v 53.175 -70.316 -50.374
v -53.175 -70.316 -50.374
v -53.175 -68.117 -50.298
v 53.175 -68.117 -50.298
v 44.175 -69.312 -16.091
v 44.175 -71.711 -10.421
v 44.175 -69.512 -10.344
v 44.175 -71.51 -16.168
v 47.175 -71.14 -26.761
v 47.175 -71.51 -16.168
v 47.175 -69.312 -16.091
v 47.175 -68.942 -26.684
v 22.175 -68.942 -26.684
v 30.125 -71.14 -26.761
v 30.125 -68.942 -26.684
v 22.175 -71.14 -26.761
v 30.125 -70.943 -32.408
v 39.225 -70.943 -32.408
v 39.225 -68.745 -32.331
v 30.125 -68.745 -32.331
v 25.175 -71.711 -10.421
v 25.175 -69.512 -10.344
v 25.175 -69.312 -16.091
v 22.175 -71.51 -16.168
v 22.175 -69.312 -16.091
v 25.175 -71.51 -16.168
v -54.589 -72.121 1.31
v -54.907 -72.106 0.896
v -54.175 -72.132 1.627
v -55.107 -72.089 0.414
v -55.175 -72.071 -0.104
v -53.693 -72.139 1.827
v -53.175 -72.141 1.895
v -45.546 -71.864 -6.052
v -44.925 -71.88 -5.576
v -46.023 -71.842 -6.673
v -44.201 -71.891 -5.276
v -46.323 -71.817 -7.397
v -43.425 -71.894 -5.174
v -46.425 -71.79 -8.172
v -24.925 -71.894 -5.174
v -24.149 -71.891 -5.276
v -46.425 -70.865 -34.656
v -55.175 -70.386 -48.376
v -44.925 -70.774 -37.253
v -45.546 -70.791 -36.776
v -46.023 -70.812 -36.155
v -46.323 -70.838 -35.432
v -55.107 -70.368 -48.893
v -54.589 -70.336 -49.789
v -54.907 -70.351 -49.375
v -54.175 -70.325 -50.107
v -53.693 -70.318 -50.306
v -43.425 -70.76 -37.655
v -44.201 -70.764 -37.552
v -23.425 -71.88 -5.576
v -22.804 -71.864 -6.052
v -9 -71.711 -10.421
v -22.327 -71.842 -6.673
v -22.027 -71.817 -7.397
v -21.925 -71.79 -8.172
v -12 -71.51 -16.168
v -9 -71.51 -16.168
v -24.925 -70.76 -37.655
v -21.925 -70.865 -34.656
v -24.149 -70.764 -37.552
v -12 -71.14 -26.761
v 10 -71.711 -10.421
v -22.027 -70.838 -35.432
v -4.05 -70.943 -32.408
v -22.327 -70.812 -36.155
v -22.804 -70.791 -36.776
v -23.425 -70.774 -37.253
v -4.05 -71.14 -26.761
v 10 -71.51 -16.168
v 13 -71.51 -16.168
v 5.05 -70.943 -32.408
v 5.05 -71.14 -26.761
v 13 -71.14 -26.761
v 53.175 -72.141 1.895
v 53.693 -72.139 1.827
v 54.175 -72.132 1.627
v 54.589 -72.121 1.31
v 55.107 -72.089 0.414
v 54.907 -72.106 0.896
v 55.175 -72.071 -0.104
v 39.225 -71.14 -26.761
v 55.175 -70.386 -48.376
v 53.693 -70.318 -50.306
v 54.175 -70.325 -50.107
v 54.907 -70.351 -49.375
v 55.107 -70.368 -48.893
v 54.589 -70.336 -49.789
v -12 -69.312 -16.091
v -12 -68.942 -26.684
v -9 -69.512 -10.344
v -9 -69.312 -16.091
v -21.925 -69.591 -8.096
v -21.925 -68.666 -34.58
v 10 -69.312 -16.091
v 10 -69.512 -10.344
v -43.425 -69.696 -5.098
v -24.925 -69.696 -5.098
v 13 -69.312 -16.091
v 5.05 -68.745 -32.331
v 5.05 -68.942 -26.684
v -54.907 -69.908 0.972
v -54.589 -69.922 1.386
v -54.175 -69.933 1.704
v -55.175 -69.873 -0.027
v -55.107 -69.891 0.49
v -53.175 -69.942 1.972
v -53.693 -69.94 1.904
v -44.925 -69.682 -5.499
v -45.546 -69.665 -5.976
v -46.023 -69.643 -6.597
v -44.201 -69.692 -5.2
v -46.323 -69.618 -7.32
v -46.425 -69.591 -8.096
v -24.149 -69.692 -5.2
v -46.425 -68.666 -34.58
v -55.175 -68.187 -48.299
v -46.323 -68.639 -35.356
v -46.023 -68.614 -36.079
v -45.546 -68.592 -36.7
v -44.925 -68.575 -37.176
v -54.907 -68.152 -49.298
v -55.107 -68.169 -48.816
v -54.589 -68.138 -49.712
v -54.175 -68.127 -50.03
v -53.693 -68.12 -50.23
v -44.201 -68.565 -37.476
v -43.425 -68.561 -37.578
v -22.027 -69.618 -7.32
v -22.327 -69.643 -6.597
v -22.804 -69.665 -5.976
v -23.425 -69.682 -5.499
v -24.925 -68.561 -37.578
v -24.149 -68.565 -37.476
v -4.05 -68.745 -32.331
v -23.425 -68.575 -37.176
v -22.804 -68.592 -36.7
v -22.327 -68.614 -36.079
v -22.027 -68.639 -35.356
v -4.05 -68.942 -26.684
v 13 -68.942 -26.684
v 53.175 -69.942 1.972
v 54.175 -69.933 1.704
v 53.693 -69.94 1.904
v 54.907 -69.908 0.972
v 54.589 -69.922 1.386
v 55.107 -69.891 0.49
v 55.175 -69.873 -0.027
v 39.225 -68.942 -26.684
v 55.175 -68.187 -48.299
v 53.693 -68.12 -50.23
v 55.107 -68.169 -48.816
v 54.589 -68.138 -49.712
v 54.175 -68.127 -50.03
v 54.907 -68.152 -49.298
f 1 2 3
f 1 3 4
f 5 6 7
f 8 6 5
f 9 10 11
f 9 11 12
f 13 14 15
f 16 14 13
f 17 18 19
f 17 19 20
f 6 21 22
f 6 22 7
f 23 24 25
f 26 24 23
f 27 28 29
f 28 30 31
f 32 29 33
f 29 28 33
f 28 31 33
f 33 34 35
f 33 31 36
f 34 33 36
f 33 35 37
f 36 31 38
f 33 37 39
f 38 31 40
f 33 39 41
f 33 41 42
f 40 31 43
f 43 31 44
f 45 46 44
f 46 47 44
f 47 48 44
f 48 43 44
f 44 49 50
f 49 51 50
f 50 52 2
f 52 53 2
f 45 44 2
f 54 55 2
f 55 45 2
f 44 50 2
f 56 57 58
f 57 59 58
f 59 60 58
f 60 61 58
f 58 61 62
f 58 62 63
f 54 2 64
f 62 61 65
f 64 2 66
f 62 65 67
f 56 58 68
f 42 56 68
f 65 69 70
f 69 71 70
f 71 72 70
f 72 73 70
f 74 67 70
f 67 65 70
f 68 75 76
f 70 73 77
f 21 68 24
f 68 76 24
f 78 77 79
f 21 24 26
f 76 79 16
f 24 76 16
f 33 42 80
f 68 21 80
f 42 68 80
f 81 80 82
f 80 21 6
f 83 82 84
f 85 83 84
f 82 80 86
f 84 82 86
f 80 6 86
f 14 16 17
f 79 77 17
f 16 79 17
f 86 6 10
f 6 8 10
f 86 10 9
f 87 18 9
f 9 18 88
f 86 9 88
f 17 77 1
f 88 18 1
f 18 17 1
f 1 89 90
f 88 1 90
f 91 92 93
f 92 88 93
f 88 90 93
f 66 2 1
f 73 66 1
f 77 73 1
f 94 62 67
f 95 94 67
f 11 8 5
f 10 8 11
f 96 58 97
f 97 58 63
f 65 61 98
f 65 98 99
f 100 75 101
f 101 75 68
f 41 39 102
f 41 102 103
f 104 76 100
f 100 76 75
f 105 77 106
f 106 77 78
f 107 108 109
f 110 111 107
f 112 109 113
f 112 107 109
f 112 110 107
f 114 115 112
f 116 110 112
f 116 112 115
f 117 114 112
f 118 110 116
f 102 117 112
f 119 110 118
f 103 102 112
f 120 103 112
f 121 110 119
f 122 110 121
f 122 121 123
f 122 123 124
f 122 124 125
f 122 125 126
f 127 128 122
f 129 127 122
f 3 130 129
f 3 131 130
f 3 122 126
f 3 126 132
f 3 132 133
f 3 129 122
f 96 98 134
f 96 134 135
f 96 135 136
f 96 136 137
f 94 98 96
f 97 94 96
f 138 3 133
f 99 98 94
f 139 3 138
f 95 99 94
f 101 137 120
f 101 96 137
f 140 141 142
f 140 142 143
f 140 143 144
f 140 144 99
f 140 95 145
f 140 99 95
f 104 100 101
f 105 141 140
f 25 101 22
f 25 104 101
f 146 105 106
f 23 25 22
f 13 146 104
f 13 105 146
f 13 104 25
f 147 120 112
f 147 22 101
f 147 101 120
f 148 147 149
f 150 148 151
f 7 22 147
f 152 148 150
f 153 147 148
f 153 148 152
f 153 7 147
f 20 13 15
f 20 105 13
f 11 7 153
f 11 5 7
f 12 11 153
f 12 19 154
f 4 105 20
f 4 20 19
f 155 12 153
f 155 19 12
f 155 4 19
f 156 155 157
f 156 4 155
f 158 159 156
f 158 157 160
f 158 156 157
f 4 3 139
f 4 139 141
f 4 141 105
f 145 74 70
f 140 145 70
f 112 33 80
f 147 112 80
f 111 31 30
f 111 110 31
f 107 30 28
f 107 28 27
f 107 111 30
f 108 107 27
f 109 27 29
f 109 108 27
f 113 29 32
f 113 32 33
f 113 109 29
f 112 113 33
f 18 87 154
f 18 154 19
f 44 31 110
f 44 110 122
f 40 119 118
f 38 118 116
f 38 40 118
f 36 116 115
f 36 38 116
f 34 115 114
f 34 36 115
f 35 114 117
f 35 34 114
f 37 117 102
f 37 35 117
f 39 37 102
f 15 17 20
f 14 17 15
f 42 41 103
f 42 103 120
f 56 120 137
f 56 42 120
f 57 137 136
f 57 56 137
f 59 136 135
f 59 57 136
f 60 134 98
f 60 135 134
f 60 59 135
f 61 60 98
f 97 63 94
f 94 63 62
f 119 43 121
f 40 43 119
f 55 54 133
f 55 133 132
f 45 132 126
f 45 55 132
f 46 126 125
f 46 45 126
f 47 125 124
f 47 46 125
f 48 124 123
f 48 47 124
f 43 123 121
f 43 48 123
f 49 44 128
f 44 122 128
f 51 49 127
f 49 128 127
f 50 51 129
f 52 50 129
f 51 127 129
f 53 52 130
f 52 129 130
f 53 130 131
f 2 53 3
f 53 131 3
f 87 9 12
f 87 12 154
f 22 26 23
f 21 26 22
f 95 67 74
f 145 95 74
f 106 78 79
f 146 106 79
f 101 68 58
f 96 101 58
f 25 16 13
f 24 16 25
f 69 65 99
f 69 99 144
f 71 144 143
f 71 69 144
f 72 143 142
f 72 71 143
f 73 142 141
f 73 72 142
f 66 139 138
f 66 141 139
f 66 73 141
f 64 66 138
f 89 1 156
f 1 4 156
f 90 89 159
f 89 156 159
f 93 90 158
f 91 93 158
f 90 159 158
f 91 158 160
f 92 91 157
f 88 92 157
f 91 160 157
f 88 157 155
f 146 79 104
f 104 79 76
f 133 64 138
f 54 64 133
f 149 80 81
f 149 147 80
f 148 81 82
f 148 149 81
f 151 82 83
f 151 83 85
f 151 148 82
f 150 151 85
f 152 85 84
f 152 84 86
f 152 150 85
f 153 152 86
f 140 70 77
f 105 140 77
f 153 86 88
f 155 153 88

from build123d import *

# Parameters (mm, degrees)
SKETCH1_W           = 110.35
SKETCH1_H           = 52.301351528
BOSS_EXTRUDE1_DEPTH = 2.2
CUT_EXTRUDE1_REACH  = 75.143
FILLET1_R           = 2


with BuildPart() as part:
    # Sketch1 → Boss-Extrude1 (new body)
    with BuildSketch(Plane(origin=(0, -71.98718802, -2.513847999), x_dir=(1, 0, 0), z_dir=(0, 0.9993908270190958, 0.03489949670250105))):
        with Locations((0, 21.739080484)):
            Rectangle(SKETCH1_W, SKETCH1_H)
    extrude(amount=BOSS_EXTRUDE1_DEPTH)

    # Sketch2 → Cut-Extrude1 (cut, up to next)
    with BuildSketch(Plane(origin=(0, -71.98718802, -2.513847999), x_dir=(1, 0, 0), z_dir=(0, -0.9993908270190958, -0.03489949670250106)), mode=Mode.PRIVATE) as cut_extrude1_sk1:
        Polygon((-4.05, -24.262096542), (-4.05, -29.912096542), (5.05, -29.912096542), (5.05, -24.262096542), (13, -24.262096542), (13, -13.662096542), (10, -13.662096542), (10, -7.912096542), (-9, -7.912096542), (-9, -13.662096542), (-12, -13.662096542), (-12, -24.262096542), align=None)
    cut_extrude1_tool1 = extrude(cut_extrude1_sk1.sketch, amount=-CUT_EXTRUDE1_REACH, mode=Mode.PRIVATE) & part.part
    # Sketch2 → Cut-Extrude1 (cut, up to next)
    with BuildSketch(Plane(origin=(0, -71.98718802, -2.513847999), x_dir=(1, 0, 0), z_dir=(0, -0.9993908270190958, -0.03489949670250106)), mode=Mode.PRIVATE) as cut_extrude1_sk2:
        with BuildLine():
            Line((-43.425, -2.662096542), (-24.925, -2.662096542))
            ThreePointArc((-24.925, -2.662096542), (-22.803679656, -3.540776198), (-21.925, -5.662096542))
            Line((-21.925, -5.662096542), (-21.925, -32.162096542))
            ThreePointArc((-21.925, -32.162096542), (-22.803679656, -34.283416885), (-24.925, -35.162096542))
            Line((-24.925, -35.162096542), (-43.425, -35.162096542))
            ThreePointArc((-43.425, -35.162096542), (-45.546320344, -34.283416885), (-46.425, -32.162096542))
            Line((-46.425, -32.162096542), (-46.425, -5.662096542))
            ThreePointArc((-46.425, -5.662096542), (-45.546320344, -3.540776198), (-43.425, -2.662096542))
        make_face()
    cut_extrude1_tool2 = extrude(cut_extrude1_sk2.sketch, amount=-CUT_EXTRUDE1_REACH, mode=Mode.PRIVATE) & part.part
    # Sketch2 → Cut-Extrude1 (cut, up to next)
    with BuildSketch(Plane(origin=(0, -71.98718802, -2.513847999), x_dir=(1, 0, 0), z_dir=(0, -0.9993908270190958, -0.03489949670250106)), mode=Mode.PRIVATE) as cut_extrude1_sk3:
        Polygon((30.125, -24.262096542), (22.175, -24.262096542), (22.175, -13.662096542), (25.175, -13.662096542), (25.175, -7.912096542), (44.175, -7.912096542), (44.175, -13.662096542), (47.175, -13.662096542), (47.175, -24.262096542), (39.225, -24.262096542), (39.225, -29.912096542), (30.125, -29.912096542), align=None)
    cut_extrude1_tool3 = extrude(cut_extrude1_sk3.sketch, amount=-CUT_EXTRUDE1_REACH, mode=Mode.PRIVATE) & part.part
    add(cut_extrude1_tool1.solids().sort_by_distance((0.5, -71.364395, -20.348299))[0], mode=Mode.SUBTRACT)
    add(cut_extrude1_tool2.solids().sort_by_distance((-34.175, -71.327165, -21.414424))[0], mode=Mode.SUBTRACT)
    add(cut_extrude1_tool3.solids().sort_by_distance((34.675, -71.364395, -20.348299))[0], mode=Mode.SUBTRACT)

    # Fillet1
    fillet1_edges = [part.edges().sort_by_distance(p)[0] for p in [
        (-55.175, -69.21652972, -50.336041655),
        (55.175, -69.21652972, -50.336041655),
        (55.175, -71.041820566, 1.933449303),
        (-55.175, -71.041820566, 1.933449303),
    ]]
    fillet(fillet1_edges, radius=FILLET1_R)


solid = part.part
